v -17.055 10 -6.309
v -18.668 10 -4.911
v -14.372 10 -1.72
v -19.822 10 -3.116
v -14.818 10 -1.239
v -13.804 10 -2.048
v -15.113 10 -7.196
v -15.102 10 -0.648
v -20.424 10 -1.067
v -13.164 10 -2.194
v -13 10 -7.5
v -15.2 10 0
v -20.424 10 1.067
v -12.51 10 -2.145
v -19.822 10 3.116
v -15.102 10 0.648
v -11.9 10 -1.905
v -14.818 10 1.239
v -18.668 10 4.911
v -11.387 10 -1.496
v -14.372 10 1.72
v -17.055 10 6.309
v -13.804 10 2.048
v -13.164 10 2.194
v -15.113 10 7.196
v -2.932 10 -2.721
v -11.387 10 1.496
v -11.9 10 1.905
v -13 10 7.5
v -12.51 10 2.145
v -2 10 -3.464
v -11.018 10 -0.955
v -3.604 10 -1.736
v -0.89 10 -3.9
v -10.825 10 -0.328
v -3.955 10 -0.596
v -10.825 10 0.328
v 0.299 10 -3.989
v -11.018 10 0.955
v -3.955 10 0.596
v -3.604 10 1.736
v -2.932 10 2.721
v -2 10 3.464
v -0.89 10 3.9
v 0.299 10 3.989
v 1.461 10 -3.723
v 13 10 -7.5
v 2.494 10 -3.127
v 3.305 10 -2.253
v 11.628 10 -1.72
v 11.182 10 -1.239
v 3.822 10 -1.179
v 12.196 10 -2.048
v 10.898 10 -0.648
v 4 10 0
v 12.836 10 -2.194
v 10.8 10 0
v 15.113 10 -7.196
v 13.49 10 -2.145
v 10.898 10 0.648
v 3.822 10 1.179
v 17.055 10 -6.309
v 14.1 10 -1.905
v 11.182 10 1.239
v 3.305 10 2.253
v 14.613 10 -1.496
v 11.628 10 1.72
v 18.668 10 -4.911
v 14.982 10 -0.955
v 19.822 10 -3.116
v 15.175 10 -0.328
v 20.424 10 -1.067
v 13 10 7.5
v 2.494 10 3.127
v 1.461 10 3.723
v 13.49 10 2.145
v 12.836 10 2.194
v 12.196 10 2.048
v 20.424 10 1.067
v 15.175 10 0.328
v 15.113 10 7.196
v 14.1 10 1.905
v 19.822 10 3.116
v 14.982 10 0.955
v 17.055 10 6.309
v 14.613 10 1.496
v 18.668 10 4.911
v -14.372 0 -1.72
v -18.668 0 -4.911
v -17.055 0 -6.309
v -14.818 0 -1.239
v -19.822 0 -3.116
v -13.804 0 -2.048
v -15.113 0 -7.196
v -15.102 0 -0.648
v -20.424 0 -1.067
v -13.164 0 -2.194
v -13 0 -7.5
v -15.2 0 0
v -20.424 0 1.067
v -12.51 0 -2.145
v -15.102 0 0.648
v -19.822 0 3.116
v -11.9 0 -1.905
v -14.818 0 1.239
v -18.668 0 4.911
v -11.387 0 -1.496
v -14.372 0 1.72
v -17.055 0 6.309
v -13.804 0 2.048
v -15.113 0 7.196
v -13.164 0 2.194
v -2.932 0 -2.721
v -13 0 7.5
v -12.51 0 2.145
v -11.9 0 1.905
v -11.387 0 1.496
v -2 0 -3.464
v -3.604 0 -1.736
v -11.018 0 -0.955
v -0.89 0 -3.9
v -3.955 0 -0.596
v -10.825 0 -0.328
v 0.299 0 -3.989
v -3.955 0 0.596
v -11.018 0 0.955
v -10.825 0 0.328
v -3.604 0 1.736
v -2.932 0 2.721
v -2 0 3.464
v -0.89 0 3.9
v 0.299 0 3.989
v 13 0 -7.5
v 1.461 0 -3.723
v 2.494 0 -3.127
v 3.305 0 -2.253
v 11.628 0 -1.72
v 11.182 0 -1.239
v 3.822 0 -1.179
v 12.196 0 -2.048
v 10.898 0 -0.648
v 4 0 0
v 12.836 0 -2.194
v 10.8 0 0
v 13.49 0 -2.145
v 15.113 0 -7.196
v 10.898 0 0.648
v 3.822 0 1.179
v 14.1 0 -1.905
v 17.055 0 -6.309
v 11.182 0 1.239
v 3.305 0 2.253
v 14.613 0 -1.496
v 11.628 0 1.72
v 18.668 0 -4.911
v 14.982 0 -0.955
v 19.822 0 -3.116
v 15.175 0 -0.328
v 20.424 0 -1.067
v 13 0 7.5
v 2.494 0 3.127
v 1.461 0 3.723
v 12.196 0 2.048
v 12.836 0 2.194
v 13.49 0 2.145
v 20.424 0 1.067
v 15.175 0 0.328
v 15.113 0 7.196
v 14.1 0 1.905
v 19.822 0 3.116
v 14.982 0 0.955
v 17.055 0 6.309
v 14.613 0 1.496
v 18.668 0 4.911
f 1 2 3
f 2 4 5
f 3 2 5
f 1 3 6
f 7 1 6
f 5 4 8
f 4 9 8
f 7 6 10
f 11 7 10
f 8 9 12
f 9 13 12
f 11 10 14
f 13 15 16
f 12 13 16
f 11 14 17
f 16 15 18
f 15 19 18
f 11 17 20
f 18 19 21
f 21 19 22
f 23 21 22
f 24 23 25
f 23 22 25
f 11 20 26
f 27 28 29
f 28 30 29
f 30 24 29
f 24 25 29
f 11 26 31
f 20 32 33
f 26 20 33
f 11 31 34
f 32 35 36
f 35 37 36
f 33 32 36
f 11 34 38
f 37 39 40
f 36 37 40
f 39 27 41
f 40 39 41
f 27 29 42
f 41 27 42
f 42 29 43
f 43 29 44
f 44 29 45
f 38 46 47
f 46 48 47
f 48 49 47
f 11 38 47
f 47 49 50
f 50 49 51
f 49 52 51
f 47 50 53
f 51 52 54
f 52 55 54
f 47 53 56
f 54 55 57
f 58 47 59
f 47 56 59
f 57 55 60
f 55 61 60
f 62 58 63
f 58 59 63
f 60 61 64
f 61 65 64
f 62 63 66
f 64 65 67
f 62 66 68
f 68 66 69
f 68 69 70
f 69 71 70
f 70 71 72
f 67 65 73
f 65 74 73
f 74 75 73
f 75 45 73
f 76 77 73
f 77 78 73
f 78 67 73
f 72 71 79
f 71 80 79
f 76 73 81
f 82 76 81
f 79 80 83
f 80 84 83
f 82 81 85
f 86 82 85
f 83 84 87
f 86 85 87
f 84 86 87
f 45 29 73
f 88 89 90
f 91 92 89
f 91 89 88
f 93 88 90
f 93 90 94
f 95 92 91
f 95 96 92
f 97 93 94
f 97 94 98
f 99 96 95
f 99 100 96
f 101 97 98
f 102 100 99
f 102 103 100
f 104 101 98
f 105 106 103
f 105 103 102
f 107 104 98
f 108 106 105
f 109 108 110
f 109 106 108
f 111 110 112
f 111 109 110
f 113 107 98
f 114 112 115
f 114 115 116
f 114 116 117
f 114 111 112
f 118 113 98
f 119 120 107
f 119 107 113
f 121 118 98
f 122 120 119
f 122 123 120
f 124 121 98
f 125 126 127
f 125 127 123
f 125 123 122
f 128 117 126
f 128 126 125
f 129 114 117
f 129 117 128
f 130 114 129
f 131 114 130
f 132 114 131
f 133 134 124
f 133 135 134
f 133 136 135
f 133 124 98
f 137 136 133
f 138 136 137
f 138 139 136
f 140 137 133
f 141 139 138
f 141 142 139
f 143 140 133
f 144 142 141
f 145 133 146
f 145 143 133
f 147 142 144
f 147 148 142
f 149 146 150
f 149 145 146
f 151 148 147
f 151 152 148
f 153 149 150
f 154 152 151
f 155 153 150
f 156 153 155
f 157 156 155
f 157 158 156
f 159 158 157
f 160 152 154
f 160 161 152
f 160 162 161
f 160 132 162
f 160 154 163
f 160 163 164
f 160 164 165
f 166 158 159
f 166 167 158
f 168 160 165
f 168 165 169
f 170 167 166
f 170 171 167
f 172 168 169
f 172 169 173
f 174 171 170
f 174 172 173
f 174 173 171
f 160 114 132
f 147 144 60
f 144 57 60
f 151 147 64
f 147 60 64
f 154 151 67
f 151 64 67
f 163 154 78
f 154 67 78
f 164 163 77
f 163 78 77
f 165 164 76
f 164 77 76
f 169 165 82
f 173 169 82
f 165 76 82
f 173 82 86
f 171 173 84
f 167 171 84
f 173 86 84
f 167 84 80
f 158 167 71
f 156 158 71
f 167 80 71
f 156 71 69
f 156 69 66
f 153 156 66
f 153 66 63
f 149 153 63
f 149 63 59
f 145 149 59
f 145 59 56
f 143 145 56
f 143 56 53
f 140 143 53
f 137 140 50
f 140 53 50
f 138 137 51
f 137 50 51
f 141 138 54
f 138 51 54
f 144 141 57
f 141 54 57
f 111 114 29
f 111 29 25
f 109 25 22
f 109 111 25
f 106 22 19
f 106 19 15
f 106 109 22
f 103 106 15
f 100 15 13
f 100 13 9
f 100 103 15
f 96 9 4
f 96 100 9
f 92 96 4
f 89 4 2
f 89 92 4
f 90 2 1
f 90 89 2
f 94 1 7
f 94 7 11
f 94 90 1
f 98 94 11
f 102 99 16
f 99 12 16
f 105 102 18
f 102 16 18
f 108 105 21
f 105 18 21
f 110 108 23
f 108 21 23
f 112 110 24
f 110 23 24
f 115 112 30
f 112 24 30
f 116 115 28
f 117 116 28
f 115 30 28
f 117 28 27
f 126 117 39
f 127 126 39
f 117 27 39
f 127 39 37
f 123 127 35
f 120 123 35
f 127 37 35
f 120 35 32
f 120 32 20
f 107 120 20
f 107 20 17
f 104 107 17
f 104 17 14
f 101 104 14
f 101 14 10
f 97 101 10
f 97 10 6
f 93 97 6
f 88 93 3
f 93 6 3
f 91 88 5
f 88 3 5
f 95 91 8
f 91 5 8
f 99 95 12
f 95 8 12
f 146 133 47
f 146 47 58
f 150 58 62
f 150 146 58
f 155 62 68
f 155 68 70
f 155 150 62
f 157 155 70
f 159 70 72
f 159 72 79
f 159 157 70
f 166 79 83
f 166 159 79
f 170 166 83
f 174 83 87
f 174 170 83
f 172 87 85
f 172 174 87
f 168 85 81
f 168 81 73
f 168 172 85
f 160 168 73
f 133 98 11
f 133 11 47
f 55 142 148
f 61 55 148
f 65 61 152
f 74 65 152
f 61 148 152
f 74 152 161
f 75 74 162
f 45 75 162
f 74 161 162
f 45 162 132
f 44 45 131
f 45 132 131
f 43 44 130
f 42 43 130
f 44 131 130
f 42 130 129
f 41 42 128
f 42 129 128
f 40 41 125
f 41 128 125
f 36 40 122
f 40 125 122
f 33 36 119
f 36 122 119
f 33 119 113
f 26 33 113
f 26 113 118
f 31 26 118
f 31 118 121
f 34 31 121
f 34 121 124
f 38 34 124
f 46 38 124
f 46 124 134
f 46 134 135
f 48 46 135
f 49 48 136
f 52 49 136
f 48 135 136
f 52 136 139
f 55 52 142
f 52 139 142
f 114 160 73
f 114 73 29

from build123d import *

# Parameters (mm, degrees)
F0_R     = 4
F1_DEPTH = 10
F2_D     = 4.4
F2_DEPTH = 10
F2_TIP   = 1.3218933619


with BuildPart() as f1:
    # F0 (on Front) → F1 (new body)
    with BuildSketch(Plane.XZ):
        with BuildLine():
            Line((-13, -7.5), (13, -7.5))
            ThreePointArc((13, -7.5), (20.5, 0), (13, 7.5))
            Line((13, 7.5), (-13, 7.5))
            ThreePointArc((-13, 7.5), (-20.5, 0), (-13, -7.5))
        make_face()
        Circle(F0_R, mode=Mode.SUBTRACT)
    extrude(amount=-F1_DEPTH)

    # F2
    with Locations(Plane.XZ):
        with Locations((-13, 0), (13, 0)):
            Hole(F2_D / 2, depth=F2_DEPTH)
            with Locations((0, 0, -(F2_DEPTH + F2_TIP / 2))):  # 118° drill point
                Cone(0, F2_D / 2, F2_TIP, mode=Mode.SUBTRACT)


solid = f1.part
